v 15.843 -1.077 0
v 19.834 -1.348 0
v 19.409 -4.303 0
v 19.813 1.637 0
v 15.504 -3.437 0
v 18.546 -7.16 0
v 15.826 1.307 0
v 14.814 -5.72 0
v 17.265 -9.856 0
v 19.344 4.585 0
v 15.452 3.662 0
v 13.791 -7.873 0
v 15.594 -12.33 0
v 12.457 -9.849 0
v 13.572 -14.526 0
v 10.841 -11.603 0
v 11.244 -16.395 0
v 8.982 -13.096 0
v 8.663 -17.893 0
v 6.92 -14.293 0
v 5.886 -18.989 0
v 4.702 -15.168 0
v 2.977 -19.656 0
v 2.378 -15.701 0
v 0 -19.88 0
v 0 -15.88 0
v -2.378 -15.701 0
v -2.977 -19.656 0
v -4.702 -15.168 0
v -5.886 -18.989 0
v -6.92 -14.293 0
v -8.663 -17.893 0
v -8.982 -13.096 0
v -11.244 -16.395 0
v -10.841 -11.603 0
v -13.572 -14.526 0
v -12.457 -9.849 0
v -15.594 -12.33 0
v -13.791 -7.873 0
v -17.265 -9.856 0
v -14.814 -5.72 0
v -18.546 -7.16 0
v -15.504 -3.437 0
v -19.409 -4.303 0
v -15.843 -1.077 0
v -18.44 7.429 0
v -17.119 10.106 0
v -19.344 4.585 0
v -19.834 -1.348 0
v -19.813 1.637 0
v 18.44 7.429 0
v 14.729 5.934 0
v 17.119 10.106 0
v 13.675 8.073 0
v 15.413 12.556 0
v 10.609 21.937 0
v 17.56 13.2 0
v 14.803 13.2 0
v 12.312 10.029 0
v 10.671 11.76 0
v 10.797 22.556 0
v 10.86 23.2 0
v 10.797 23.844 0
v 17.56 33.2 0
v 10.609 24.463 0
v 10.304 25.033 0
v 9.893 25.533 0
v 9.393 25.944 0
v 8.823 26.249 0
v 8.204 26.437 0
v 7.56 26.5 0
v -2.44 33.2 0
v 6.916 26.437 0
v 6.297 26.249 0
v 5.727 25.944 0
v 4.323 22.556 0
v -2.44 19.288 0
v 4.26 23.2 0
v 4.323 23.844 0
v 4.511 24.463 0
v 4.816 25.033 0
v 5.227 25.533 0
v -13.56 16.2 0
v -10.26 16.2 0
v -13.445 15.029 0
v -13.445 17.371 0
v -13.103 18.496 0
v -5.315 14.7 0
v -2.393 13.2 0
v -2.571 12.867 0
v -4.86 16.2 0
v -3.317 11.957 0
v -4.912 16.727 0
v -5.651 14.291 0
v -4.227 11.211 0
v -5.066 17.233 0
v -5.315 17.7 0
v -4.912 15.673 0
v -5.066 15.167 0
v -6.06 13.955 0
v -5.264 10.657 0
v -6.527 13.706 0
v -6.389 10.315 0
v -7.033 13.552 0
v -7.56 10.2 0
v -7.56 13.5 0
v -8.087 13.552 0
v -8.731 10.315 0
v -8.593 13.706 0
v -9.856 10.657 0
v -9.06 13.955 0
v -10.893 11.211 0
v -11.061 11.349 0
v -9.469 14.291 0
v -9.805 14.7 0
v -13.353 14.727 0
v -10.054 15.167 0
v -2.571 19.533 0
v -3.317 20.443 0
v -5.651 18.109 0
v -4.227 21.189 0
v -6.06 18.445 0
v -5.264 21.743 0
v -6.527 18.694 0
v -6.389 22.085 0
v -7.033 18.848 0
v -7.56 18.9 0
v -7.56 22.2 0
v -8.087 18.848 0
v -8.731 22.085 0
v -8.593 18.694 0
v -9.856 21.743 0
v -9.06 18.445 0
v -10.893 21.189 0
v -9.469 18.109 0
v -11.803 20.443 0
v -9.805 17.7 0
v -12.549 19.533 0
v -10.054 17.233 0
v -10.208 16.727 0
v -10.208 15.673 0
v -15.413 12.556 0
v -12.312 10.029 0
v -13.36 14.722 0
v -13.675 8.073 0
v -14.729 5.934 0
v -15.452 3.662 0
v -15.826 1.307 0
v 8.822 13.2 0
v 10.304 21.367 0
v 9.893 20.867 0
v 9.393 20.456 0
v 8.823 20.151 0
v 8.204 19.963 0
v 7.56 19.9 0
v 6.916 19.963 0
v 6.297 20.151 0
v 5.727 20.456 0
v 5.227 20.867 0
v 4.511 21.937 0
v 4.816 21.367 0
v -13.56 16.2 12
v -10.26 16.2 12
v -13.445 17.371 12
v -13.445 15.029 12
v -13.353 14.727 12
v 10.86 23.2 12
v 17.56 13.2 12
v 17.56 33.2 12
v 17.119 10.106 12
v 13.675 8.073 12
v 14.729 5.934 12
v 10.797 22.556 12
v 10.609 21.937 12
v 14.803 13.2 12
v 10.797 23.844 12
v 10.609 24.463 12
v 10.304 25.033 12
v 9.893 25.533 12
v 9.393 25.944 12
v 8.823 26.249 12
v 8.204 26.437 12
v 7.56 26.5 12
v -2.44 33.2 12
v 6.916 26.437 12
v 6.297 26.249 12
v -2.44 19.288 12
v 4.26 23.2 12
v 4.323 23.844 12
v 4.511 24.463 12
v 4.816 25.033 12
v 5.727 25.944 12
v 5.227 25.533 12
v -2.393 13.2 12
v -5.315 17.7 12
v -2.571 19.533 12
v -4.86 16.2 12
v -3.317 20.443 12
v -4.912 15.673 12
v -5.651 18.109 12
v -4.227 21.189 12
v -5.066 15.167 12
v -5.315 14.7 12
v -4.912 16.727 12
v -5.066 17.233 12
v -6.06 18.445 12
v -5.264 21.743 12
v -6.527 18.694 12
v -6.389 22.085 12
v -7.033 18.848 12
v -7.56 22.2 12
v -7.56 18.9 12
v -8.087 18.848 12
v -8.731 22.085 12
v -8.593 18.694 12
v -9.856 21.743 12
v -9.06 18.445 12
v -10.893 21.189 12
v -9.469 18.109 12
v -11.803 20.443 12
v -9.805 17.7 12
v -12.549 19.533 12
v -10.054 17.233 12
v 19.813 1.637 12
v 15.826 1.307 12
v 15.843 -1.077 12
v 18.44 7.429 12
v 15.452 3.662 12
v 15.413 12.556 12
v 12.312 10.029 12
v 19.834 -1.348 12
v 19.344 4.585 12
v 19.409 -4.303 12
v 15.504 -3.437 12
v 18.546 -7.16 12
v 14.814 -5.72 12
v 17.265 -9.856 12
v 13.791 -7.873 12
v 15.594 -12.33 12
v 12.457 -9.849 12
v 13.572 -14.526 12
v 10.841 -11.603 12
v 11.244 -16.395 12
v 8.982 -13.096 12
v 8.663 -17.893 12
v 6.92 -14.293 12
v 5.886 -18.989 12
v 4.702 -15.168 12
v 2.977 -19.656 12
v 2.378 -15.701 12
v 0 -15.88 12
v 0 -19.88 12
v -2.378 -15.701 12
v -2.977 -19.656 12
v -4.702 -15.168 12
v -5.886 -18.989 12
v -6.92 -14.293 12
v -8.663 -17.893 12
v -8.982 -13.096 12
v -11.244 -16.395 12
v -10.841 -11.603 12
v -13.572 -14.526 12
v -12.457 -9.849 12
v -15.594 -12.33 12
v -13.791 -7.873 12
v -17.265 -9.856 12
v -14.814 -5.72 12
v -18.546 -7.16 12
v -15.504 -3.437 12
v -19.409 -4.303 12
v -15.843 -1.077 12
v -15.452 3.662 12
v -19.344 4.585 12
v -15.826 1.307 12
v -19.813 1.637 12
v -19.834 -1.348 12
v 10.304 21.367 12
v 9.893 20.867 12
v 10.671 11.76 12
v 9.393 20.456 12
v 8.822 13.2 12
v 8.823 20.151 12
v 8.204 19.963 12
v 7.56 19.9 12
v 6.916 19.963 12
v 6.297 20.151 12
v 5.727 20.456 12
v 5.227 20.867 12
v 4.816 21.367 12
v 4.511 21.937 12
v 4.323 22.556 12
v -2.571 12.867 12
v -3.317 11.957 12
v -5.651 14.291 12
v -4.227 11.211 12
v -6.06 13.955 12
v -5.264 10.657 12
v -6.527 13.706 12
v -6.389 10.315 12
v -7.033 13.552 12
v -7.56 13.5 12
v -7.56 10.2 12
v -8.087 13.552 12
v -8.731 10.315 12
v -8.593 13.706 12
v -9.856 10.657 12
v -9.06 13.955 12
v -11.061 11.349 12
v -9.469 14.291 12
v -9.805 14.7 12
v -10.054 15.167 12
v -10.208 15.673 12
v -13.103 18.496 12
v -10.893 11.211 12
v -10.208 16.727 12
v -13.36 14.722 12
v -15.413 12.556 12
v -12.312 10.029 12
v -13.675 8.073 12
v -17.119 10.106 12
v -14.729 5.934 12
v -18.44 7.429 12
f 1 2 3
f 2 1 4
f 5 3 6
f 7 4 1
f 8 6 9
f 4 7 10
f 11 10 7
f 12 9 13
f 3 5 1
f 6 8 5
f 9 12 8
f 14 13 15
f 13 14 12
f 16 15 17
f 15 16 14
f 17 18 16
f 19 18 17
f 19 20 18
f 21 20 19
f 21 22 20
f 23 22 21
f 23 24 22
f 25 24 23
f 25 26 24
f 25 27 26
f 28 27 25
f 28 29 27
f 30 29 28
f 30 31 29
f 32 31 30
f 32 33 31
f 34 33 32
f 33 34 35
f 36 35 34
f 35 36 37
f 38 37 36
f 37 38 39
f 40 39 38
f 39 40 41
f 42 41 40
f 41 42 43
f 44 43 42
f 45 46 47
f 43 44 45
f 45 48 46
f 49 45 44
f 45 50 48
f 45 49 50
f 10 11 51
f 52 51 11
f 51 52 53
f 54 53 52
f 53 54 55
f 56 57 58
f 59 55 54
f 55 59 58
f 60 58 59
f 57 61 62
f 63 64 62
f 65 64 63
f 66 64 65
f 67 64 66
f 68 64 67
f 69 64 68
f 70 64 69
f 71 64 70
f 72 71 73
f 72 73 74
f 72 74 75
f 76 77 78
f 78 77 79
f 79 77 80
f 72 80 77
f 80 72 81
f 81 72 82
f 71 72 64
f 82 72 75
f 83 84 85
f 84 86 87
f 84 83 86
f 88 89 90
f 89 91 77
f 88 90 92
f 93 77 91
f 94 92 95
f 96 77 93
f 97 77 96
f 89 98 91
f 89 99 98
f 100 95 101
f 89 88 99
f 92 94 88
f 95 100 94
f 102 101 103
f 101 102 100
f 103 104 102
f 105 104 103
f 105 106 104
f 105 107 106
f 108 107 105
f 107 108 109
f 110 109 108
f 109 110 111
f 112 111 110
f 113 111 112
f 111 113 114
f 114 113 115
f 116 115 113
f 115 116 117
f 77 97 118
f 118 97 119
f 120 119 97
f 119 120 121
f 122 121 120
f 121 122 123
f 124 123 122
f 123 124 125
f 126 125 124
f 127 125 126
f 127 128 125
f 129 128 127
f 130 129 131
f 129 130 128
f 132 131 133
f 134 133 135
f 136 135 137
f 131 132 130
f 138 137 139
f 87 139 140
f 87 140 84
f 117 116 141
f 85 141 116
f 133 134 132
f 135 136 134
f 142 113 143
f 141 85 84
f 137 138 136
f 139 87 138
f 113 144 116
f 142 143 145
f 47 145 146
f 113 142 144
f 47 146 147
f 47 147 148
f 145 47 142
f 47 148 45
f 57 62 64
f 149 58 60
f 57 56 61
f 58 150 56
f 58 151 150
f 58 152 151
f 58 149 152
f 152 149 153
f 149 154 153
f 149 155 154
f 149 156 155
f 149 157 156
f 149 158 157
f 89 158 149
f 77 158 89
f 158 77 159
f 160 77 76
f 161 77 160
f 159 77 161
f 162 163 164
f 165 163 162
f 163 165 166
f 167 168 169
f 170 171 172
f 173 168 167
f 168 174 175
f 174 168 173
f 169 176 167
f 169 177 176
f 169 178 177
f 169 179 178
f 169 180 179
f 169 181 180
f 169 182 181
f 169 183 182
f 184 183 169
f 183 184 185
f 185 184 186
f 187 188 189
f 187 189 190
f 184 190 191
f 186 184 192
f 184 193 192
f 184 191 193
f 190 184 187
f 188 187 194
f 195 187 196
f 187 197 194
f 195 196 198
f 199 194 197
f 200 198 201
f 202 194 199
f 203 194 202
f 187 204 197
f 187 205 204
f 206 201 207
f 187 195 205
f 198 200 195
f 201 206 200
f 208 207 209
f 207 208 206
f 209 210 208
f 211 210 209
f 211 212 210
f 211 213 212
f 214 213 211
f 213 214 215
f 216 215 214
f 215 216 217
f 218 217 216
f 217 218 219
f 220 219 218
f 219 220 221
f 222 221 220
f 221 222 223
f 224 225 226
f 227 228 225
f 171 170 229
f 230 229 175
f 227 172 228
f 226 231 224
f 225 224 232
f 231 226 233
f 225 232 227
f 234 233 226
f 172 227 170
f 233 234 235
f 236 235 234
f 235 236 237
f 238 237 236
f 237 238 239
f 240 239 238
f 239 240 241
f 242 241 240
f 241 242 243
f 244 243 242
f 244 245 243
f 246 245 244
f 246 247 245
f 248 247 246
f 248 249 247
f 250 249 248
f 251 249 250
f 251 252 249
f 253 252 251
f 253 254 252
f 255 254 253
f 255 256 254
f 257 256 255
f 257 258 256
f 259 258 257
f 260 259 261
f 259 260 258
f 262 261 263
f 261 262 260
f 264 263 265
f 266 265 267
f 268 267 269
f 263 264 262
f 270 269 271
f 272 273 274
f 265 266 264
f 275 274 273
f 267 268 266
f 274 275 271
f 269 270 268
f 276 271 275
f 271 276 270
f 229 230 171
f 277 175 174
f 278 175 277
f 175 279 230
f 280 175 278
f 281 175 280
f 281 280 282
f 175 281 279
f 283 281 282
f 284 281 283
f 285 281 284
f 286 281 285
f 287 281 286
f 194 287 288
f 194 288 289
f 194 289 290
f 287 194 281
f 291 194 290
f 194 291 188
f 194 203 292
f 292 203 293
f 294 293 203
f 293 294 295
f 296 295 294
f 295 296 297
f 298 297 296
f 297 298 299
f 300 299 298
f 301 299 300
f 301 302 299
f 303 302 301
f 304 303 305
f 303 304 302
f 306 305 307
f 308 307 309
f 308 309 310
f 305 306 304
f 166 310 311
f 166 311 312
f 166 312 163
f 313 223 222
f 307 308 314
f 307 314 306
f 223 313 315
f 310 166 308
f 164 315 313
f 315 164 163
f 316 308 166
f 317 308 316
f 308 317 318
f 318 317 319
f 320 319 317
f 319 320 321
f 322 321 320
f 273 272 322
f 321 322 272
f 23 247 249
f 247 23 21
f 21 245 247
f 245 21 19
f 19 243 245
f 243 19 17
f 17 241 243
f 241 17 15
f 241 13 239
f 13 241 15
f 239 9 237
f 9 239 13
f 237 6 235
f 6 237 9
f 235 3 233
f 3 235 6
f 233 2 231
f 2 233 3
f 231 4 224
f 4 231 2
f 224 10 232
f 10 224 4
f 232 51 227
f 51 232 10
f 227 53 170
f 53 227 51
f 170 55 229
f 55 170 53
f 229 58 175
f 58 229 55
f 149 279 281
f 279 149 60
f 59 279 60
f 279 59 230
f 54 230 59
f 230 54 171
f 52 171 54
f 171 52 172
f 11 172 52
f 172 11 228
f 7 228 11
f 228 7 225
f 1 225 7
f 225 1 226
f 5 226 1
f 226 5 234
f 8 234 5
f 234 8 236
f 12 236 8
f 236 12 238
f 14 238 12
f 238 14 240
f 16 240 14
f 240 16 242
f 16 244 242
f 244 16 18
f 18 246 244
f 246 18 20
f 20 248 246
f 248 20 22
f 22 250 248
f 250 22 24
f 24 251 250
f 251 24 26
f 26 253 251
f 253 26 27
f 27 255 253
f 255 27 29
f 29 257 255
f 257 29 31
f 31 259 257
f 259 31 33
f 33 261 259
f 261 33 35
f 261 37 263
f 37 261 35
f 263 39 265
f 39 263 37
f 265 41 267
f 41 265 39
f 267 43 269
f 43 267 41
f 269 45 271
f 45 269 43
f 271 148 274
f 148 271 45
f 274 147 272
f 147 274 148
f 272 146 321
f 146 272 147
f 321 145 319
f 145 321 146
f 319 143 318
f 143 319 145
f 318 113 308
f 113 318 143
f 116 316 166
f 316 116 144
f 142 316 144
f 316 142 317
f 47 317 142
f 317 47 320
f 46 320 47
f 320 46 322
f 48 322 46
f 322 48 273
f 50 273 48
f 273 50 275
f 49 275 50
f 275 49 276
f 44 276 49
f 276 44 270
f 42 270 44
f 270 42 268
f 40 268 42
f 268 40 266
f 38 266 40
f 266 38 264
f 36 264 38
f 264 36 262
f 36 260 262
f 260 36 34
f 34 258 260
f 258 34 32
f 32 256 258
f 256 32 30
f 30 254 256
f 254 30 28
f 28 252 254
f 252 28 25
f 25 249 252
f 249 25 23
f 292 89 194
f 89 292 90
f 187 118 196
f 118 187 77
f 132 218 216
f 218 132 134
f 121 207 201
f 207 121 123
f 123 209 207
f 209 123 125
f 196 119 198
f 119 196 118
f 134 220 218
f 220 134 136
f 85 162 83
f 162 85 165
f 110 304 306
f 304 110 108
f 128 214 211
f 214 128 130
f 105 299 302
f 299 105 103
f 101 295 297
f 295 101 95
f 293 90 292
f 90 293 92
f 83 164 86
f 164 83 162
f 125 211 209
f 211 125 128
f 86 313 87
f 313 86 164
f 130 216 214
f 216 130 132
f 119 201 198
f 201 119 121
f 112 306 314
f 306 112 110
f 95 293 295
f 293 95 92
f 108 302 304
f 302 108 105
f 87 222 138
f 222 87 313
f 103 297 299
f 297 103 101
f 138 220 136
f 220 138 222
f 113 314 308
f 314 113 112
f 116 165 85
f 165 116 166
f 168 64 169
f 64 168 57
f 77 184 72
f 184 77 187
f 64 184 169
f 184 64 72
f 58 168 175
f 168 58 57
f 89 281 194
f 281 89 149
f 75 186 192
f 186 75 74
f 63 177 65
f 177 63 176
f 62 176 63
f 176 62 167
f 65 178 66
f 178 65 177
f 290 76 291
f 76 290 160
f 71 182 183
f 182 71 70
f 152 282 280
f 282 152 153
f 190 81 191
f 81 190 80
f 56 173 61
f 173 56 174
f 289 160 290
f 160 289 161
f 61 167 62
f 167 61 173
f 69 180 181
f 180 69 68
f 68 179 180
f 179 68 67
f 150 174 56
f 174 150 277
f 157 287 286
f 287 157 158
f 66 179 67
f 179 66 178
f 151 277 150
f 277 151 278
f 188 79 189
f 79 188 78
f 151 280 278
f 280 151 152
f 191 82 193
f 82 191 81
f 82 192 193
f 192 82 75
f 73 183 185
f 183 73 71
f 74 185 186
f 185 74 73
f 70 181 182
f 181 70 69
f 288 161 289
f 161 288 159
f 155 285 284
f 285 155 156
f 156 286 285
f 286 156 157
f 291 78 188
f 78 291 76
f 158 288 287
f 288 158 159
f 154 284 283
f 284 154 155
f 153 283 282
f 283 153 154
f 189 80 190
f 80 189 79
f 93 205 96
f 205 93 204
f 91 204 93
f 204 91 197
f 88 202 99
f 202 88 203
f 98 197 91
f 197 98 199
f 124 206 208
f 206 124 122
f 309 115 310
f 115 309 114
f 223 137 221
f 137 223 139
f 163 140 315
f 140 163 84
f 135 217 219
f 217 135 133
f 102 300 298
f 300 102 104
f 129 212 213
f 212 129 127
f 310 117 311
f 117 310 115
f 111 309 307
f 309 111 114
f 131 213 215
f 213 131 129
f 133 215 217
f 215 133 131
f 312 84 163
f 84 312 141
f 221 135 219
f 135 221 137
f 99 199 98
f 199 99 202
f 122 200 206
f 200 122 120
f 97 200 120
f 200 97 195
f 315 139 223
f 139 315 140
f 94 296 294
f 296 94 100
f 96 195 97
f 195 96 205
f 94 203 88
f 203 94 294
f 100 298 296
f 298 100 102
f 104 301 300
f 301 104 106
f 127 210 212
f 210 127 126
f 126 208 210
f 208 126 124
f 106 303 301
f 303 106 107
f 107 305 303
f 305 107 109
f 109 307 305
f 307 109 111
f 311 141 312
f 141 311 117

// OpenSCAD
$fn = 32;

// ----------------------------------------------------------------------
// Pipe clamp: 39.76 mm ring, 4 mm wall, 12 mm wide
// ----------------------------------------------------------------------

// --- parameters (mm) ---
outer_r = 19.88;          // clamp outside radius
inner_r = 15.88;          // pipe bore radius
band = 4;                 // band thickness
clamp_w = 12;             // clamp width
opening = 50;             // opening angle between the ends
lug_w = 20;               // lug width
lug_len = 20;             // lug length
bolt_d = 6.6;             // bolt hole
knuckle_d = 12;           // hinge knuckle diameter
pin_d = 5.4;              // hinge pin hole

clamp_profile = [[-8.402, 18.017], [-11.005, 16.556], [-13.36, 14.722], [-15.413, 12.556], [-17.119, 10.106], [-18.44, 7.429], [-19.344, 4.585], [-19.813, 1.637], [-19.834, -1.348], [-19.409, -4.303], [-18.546, -7.16], [-17.265, -9.856], [-15.594, -12.33], [-13.572, -14.526], [-11.244, -16.395], [-8.663, -17.893], [-5.886, -18.989], [-2.977, -19.656], [0, -19.88], [2.977, -19.656], [5.886, -18.989], [8.663, -17.893], [11.244, -16.395], [13.572, -14.526], [15.594, -12.33], [17.265, -9.856], [18.546, -7.16], [19.409, -4.303], [19.834, -1.348], [19.813, 1.637], [19.344, 4.585], [18.44, 7.429], [17.119, 10.106], [15.413, 12.556], [13.36, 14.722], [11.005, 16.556], [8.402, 18.017], [6.711, 14.392], [8.79, 13.225], [10.671, 11.76], [12.312, 10.029], [13.675, 8.073], [14.729, 5.934], [15.452, 3.662], [15.826, 1.307], [15.843, -1.077], [15.504, -3.437], [14.814, -5.72], [13.791, -7.873], [12.457, -9.849], [10.841, -11.603], [8.982, -13.096], [6.92, -14.293], [4.702, -15.168], [2.378, -15.701], [0, -15.88], [-2.378, -15.701], [-4.702, -15.168], [-6.92, -14.293], [-8.982, -13.096], [-10.841, -11.603], [-12.457, -9.849], [-13.791, -7.873], [-14.814, -5.72], [-15.504, -3.437], [-15.843, -1.077], [-15.826, 1.307], [-15.452, 3.662], [-14.729, 5.934], [-13.675, 8.073], [-12.312, 10.029], [-10.671, 11.76], [-8.79, 13.225], [-6.711, 14.392]];

difference() {
  union() {
    linear_extrude(height = clamp_w) polygon(clamp_profile);
    /* hinge knuckle, sunk 2 mm into the band end */
    translate([-7.56, 16.2, 0]) cylinder(h = clamp_w, d = knuckle_d);
    /* bolt lug on the other end */
    translate([-2.44, 13.2, 0]) cube([lug_w, 20, clamp_w]);
  }
  translate([7.56, 23.2, -2.5]) cylinder(h = clamp_w + 5, d = bolt_d);
  translate([-7.56, 16.2, -2.5]) cylinder(h = clamp_w + 5, d = pin_d);
}
